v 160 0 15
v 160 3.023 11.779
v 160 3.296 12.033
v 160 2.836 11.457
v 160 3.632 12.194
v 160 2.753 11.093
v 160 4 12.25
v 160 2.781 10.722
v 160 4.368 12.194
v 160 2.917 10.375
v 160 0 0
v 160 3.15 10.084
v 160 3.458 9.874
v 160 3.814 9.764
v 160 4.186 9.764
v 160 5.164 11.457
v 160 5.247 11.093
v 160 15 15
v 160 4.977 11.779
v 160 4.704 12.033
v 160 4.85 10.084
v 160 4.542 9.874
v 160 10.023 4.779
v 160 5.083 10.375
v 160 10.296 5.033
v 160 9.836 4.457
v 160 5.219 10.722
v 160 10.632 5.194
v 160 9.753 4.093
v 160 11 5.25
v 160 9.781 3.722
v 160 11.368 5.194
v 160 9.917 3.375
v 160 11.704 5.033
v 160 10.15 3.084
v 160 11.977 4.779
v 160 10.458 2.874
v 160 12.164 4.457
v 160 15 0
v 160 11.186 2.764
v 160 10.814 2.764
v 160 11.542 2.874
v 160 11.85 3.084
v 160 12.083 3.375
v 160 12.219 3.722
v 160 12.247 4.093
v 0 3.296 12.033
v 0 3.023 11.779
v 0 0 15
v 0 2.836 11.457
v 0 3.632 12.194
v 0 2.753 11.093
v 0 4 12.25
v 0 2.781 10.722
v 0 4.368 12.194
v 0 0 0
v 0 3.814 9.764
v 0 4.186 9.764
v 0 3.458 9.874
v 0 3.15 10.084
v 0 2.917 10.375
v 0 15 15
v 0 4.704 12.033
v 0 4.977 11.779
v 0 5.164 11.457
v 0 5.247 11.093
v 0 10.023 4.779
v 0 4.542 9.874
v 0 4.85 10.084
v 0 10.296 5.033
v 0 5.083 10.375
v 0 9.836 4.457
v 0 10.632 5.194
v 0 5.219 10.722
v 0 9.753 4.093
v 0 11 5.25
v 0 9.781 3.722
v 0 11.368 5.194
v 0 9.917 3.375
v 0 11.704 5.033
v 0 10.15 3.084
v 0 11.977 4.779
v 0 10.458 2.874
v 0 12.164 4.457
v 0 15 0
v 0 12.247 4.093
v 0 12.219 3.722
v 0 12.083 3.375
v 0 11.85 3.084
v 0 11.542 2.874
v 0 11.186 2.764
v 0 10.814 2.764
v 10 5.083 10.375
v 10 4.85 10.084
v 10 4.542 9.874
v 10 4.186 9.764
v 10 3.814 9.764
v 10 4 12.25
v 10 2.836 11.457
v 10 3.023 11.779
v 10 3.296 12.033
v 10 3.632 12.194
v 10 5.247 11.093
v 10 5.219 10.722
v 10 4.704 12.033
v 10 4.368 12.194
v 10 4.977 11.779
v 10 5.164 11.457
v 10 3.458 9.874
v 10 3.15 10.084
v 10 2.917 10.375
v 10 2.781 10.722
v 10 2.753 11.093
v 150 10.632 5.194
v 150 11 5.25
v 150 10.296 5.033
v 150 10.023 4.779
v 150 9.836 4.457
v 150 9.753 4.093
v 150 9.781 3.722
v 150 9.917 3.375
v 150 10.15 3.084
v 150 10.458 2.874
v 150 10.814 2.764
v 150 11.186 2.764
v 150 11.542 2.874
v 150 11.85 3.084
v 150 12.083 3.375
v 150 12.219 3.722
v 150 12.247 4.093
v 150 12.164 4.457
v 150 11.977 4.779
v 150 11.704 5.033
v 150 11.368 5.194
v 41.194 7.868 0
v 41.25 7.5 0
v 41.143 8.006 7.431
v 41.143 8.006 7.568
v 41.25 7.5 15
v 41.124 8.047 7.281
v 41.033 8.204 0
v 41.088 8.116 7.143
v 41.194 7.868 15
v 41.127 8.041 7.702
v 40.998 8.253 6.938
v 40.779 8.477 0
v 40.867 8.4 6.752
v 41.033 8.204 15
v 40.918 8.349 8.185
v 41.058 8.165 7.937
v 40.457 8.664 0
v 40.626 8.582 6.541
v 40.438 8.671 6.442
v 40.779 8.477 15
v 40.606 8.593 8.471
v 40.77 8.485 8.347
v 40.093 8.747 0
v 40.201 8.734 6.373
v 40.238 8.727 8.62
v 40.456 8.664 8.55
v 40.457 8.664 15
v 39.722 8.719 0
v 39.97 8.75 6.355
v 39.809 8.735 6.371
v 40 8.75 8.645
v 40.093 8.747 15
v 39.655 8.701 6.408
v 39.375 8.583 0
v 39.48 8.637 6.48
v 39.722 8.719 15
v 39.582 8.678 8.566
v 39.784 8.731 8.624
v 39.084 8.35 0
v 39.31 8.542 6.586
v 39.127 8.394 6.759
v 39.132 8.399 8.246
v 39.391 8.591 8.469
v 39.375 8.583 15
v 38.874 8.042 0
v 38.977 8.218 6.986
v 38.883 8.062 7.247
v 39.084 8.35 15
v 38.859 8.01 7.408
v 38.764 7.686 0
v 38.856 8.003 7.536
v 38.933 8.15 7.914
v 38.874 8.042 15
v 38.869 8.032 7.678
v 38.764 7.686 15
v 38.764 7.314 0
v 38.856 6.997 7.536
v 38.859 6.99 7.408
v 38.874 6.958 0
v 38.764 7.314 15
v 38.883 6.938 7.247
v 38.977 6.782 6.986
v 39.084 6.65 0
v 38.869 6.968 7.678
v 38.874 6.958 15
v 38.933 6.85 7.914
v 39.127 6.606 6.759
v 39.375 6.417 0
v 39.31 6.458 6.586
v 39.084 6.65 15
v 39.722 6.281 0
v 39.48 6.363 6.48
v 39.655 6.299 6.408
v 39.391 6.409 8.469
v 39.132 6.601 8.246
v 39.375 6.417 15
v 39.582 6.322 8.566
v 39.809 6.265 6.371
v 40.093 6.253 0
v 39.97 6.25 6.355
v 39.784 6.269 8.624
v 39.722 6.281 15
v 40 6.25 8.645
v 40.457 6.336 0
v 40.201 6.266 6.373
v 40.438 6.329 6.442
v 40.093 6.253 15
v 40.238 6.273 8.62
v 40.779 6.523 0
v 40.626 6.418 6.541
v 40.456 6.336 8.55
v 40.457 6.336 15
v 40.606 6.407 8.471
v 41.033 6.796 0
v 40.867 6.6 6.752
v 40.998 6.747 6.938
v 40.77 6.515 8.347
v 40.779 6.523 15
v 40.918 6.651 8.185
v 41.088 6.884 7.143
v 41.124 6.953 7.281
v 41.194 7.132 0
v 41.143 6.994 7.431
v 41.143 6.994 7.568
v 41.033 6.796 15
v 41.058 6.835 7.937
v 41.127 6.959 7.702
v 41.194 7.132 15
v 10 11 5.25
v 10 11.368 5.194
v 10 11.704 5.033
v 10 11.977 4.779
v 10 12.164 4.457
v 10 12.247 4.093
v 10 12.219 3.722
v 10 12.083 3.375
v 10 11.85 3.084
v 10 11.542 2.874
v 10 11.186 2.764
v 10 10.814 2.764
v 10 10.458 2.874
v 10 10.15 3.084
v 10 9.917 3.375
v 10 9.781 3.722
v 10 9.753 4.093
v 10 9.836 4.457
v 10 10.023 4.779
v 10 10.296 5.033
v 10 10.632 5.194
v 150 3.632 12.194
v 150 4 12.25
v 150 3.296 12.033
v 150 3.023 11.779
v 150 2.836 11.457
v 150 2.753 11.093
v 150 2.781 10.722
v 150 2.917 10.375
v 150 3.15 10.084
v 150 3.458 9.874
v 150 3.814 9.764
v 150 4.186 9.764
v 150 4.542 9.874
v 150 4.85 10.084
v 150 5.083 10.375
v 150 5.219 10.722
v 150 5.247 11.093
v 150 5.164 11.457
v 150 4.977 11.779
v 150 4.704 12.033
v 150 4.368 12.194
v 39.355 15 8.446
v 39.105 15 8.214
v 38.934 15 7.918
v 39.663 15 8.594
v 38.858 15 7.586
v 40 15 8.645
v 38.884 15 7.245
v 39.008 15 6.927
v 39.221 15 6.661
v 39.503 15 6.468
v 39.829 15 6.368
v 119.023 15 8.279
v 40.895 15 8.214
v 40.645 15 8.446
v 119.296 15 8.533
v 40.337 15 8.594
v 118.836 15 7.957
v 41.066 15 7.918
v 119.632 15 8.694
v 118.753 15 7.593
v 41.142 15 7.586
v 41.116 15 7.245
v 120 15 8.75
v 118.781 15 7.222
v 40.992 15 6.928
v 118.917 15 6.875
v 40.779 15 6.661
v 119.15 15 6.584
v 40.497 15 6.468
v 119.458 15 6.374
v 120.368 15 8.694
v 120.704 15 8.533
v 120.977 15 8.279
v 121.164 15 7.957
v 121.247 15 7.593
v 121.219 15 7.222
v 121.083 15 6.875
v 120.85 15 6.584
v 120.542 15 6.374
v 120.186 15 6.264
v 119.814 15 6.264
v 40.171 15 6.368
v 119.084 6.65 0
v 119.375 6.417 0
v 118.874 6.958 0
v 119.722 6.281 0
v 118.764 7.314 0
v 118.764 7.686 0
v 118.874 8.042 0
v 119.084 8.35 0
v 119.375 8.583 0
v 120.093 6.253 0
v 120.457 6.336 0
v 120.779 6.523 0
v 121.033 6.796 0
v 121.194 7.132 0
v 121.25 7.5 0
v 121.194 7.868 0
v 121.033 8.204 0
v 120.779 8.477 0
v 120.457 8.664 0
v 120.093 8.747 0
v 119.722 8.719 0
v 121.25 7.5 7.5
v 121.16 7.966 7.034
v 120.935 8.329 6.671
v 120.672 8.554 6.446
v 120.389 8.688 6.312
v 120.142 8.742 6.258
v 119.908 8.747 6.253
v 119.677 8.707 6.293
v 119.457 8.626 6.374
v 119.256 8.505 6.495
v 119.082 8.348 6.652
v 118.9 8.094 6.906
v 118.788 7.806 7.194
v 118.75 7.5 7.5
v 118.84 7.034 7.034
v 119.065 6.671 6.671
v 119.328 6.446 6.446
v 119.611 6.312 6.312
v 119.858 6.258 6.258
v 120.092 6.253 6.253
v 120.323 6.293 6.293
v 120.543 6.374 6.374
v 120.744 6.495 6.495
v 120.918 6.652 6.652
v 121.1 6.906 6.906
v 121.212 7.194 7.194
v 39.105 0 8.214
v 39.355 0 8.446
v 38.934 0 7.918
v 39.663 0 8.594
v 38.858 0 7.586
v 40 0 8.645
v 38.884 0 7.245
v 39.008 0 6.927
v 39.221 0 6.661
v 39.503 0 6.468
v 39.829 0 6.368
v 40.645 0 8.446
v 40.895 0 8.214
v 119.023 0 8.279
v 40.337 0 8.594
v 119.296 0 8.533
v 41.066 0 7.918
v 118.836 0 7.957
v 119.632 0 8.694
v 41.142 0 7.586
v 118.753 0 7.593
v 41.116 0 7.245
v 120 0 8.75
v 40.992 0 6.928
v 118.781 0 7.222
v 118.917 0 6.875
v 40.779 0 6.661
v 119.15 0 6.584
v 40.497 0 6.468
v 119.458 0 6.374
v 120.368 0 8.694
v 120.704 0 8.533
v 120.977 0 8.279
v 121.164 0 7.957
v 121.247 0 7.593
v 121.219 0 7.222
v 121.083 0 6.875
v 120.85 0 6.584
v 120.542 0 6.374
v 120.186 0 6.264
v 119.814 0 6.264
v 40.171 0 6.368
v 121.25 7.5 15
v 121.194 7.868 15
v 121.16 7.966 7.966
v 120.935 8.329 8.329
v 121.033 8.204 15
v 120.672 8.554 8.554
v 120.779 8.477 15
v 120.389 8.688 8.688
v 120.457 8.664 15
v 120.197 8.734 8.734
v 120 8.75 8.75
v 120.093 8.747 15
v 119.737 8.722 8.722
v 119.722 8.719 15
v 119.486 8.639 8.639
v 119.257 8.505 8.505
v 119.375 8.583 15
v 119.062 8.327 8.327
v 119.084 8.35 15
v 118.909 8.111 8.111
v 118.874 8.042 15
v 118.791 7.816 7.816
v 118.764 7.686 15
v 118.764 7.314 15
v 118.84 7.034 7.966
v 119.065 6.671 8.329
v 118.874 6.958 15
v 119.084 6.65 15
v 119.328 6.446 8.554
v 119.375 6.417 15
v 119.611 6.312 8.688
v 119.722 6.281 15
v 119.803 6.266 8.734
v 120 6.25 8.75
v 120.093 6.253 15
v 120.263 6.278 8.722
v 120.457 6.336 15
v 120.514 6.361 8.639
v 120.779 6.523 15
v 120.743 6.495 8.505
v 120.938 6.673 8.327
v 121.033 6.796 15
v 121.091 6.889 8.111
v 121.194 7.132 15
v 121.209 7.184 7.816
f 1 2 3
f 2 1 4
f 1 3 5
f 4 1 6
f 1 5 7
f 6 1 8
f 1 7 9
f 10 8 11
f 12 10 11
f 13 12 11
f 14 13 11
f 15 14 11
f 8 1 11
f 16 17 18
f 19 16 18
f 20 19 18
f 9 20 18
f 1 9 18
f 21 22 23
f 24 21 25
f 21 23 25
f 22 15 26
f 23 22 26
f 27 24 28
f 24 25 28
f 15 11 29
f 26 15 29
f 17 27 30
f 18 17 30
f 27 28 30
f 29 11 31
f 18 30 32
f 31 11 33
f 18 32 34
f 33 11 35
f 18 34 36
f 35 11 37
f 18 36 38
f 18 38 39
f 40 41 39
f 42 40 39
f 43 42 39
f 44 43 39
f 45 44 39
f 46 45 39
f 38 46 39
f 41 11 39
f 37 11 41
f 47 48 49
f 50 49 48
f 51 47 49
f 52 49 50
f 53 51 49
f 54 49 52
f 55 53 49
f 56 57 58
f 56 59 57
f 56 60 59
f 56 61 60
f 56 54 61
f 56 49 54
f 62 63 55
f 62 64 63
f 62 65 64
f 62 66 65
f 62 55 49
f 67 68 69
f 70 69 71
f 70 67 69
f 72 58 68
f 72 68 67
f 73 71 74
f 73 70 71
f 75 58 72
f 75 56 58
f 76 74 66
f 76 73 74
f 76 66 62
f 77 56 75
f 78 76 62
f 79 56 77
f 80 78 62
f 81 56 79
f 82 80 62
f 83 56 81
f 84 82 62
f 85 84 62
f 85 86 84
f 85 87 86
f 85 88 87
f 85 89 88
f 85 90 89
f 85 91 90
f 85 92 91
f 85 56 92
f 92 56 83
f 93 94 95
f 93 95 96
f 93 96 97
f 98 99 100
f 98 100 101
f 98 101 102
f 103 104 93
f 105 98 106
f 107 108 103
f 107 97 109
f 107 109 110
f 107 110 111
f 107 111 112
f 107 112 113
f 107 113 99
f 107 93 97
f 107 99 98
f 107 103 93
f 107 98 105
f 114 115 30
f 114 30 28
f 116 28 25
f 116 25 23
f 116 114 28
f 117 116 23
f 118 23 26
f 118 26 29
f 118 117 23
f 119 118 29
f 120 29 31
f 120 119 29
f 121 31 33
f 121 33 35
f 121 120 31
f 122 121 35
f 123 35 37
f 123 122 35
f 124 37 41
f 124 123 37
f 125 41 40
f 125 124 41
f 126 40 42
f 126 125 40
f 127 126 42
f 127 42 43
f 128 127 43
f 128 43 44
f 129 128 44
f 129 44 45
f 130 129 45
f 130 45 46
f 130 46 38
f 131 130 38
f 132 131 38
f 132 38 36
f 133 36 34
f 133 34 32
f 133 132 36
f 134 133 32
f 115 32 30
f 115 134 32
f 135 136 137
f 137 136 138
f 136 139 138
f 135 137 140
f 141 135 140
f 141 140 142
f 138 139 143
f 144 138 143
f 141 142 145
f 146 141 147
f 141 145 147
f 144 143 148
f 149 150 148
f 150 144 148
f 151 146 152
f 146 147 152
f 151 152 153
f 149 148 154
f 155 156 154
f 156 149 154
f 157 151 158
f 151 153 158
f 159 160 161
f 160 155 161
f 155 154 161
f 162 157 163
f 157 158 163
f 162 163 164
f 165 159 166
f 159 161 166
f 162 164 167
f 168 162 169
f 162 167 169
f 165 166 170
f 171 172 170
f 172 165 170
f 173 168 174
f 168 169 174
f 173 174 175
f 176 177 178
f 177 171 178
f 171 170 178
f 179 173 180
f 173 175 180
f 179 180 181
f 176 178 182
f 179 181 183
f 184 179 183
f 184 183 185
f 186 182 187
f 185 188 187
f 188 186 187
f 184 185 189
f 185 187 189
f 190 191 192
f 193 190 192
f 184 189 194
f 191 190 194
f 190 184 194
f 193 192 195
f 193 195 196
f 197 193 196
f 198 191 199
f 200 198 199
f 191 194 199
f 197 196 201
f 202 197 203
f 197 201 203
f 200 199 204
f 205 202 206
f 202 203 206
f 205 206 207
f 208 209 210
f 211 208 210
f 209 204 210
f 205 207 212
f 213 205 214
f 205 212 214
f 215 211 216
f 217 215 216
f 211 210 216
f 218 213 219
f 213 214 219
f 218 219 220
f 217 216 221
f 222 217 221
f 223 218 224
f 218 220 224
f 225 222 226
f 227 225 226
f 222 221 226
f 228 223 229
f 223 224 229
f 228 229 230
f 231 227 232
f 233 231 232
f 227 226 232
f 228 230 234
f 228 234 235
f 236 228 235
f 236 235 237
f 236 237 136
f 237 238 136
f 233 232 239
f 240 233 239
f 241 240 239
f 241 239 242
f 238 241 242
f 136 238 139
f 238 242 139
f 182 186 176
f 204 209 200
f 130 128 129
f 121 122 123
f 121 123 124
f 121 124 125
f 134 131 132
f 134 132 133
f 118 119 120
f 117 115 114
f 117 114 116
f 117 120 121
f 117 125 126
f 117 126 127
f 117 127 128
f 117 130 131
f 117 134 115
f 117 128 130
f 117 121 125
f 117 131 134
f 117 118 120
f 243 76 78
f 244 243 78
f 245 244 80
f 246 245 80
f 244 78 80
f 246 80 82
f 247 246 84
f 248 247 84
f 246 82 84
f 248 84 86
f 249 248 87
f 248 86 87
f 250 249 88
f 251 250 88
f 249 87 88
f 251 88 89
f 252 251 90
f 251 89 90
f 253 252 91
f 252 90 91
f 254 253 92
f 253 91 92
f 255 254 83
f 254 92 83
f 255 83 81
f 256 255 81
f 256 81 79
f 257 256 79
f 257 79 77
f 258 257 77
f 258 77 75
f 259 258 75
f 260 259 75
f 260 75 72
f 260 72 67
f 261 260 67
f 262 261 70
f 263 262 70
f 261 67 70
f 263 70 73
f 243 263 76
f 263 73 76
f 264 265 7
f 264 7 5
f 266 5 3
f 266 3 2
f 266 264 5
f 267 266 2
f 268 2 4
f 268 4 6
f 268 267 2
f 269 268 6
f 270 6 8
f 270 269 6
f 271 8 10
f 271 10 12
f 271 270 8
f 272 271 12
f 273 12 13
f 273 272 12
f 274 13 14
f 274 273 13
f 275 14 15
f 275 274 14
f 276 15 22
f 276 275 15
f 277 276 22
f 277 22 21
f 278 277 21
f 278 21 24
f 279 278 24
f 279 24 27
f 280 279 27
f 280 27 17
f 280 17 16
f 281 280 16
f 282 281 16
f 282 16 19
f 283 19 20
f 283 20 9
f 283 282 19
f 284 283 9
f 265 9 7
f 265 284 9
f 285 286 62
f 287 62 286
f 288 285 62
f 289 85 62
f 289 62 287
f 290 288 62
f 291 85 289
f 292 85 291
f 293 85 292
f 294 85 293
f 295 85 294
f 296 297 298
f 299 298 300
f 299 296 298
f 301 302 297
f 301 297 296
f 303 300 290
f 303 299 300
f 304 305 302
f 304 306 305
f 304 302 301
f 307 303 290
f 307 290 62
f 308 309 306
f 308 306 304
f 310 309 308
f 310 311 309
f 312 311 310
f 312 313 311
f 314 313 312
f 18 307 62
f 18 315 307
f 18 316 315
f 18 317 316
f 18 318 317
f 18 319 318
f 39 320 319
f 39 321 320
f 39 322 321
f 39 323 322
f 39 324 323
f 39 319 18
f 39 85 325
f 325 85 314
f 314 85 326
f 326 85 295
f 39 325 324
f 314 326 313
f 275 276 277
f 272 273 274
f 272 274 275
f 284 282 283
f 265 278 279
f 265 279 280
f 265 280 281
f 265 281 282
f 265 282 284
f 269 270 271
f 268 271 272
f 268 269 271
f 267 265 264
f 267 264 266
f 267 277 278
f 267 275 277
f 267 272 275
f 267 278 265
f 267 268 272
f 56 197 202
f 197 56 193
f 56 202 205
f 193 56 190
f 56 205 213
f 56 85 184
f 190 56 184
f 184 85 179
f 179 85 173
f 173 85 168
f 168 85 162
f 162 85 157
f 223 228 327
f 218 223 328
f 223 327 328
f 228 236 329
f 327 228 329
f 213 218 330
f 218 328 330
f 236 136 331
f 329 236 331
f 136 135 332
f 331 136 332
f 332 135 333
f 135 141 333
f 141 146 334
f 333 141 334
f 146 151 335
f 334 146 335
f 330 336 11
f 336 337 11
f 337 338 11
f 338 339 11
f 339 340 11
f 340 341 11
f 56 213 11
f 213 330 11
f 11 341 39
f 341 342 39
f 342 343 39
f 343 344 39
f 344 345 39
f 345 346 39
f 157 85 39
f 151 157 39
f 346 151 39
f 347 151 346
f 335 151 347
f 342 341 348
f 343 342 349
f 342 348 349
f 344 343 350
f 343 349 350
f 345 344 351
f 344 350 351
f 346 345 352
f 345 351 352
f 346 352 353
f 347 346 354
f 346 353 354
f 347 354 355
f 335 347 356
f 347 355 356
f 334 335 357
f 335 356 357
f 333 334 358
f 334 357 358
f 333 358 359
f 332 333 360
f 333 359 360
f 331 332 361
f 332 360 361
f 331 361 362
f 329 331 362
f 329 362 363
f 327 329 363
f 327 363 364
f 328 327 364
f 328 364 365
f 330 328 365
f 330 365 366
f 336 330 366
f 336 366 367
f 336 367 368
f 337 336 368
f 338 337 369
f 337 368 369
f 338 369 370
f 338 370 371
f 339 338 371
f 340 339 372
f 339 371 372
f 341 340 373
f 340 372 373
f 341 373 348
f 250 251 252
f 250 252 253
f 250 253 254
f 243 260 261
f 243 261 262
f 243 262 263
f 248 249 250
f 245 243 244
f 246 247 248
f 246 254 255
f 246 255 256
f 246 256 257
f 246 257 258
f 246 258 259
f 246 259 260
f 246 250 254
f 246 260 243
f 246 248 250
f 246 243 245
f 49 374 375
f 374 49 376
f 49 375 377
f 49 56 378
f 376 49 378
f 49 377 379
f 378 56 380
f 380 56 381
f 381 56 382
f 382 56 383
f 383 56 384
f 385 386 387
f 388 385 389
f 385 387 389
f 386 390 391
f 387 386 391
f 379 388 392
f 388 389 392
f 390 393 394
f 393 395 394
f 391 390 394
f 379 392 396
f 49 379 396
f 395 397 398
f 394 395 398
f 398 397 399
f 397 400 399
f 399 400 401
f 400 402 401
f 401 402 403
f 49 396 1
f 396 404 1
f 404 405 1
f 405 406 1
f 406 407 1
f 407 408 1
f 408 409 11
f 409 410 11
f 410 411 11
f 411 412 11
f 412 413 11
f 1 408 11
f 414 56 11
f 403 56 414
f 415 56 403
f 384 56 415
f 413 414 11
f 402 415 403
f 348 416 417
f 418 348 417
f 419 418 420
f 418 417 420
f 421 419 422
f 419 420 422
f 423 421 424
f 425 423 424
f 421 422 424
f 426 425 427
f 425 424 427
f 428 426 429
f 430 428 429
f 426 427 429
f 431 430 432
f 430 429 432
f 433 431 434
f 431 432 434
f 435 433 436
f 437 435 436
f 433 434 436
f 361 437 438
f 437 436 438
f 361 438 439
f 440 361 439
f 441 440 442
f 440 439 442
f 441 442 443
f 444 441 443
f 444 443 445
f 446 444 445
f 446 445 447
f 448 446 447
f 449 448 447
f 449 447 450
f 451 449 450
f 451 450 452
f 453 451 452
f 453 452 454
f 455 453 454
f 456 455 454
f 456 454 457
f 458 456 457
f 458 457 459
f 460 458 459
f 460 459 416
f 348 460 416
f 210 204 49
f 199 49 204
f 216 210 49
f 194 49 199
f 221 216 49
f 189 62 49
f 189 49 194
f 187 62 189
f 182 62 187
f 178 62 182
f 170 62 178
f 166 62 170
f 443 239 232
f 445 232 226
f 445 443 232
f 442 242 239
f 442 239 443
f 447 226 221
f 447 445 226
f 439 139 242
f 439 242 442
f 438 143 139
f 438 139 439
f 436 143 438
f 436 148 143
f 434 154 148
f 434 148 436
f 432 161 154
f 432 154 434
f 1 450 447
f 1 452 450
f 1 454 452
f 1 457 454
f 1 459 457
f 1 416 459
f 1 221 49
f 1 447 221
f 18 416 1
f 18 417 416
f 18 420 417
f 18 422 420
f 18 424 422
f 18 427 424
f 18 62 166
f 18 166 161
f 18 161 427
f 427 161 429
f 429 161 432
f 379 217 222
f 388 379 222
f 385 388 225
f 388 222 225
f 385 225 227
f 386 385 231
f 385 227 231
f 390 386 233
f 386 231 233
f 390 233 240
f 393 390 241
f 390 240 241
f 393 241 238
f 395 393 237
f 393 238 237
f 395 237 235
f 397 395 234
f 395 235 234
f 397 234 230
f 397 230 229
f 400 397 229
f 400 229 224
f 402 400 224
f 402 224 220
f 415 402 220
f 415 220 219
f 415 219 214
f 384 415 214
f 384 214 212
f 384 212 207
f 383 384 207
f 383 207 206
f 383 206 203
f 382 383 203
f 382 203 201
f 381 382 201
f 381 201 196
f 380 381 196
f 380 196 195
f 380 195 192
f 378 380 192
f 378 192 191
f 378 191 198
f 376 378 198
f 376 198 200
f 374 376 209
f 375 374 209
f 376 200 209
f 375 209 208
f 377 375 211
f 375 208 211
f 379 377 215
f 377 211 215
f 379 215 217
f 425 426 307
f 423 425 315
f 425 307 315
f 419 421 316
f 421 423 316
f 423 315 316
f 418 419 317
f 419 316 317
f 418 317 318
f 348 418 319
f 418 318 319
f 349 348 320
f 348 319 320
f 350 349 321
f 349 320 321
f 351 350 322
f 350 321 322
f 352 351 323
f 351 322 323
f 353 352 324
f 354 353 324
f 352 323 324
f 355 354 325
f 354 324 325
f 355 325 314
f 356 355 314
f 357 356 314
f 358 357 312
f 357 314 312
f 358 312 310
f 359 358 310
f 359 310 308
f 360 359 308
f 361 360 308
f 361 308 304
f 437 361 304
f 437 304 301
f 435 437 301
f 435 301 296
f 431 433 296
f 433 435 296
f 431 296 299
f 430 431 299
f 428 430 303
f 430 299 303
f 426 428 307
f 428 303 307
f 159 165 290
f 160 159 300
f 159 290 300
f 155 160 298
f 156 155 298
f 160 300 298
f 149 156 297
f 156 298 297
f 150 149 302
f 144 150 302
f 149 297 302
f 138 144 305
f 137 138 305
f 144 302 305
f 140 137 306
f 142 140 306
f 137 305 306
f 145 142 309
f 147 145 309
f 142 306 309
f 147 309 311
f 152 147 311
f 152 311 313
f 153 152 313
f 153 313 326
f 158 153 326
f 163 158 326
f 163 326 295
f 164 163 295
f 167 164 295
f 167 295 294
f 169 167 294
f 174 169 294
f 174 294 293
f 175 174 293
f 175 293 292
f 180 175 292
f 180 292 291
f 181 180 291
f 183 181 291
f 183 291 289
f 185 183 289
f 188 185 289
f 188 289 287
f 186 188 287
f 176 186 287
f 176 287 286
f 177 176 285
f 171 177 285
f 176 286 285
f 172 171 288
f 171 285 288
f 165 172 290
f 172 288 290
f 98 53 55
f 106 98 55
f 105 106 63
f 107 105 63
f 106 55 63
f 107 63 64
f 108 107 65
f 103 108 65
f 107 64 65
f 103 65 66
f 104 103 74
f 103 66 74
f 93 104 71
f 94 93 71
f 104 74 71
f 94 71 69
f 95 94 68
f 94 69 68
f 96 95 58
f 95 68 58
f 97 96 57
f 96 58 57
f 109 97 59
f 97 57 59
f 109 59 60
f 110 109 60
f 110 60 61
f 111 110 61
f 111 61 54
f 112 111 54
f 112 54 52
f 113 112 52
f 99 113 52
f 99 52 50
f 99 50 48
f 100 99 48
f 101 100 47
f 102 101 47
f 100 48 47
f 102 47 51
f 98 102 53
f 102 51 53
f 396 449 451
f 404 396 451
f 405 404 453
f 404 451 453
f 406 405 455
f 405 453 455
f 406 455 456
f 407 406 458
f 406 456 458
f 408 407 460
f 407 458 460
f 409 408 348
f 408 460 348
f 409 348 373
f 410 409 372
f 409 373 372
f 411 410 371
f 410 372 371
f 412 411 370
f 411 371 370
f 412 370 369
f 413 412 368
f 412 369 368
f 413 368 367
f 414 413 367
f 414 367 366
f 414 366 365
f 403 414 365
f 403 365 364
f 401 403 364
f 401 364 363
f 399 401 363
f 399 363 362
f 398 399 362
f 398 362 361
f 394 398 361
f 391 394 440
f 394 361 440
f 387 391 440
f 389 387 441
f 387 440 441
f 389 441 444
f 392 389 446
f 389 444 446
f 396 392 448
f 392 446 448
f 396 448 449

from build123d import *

# Parameters (mm, degrees)
SKETCH1_W           = 160
SKETCH1_H           = 15
BOSS_EXTRUDE1_DEPTH = 15
SKETCH2_R           = 1.25
CUT_EXTRUDE1_DEPTH  = 162.400123916
SKETCH3_R           = 1.145
SKETCH3_R_2         = 1.25
CUT_EXTRUDE2_DEPTH  = 162.400123916
SKETCH6_R           = 1.25
CUT_EXTRUDE5_DEPTH  = 10
CUT_EXTRUDE6_START  = -10
SKETCH7_R           = 1.25
CUT_EXTRUDE6_DEPTH  = 10


with BuildPart() as part:
    # Sketch1 → Boss-Extrude1 (new body)
    with BuildSketch(Plane.XY):
        with Locations((80, 7.5)):
            Rectangle(SKETCH1_W, SKETCH1_H)
    extrude(amount=BOSS_EXTRUDE1_DEPTH)

    # Sketch2 → Cut-Extrude1 (cut, through all)
    with BuildSketch(Plane.XY.offset(15)):
        with Locations((40, 7.5)):
            Circle(SKETCH2_R)
        with Locations((120, 7.5)):
            Circle(SKETCH2_R)
    extrude(amount=-CUT_EXTRUDE1_DEPTH, mode=Mode.SUBTRACT)

    # Sketch3 → Cut-Extrude2 (cut, through all)
    with BuildSketch(Plane(origin=(0, 15, 0), x_dir=(1, 0, 0), z_dir=(0, 1, 0))):
        with Locations(Location((40, -7.5, 0), (0, 0, 270))):
            Circle(SKETCH3_R)
        with Locations(Location((120, -7.5, 0), (0, 0, 270))):
            Circle(SKETCH3_R_2)
    extrude(amount=-CUT_EXTRUDE2_DEPTH, mode=Mode.SUBTRACT)

    # Sketch6 → Cut-Extrude5 (cut)
    with BuildSketch(Plane.ZY):
        with Locations((4, 11)):
            Circle(SKETCH6_R)
        with Locations((11, 4)):
            Circle(SKETCH6_R)
    extrude(amount=-CUT_EXTRUDE5_DEPTH, mode=Mode.SUBTRACT)

    # Sketch7 → Cut-Extrude6 (cut)
    with BuildSketch(Plane(origin=(160, 0, 0), x_dir=(0, 0, -1), z_dir=(1, 0, 0)).offset(CUT_EXTRUDE6_START)):
        with Locations(Location((-4, 11, 0), (0, 0, 180))):
            Circle(SKETCH7_R)
        with Locations(Location((-11, 4, 0), (0, 0, 180))):
            Circle(SKETCH7_R)
    extrude(amount=CUT_EXTRUDE6_DEPTH, mode=Mode.SUBTRACT)


solid = part.part
